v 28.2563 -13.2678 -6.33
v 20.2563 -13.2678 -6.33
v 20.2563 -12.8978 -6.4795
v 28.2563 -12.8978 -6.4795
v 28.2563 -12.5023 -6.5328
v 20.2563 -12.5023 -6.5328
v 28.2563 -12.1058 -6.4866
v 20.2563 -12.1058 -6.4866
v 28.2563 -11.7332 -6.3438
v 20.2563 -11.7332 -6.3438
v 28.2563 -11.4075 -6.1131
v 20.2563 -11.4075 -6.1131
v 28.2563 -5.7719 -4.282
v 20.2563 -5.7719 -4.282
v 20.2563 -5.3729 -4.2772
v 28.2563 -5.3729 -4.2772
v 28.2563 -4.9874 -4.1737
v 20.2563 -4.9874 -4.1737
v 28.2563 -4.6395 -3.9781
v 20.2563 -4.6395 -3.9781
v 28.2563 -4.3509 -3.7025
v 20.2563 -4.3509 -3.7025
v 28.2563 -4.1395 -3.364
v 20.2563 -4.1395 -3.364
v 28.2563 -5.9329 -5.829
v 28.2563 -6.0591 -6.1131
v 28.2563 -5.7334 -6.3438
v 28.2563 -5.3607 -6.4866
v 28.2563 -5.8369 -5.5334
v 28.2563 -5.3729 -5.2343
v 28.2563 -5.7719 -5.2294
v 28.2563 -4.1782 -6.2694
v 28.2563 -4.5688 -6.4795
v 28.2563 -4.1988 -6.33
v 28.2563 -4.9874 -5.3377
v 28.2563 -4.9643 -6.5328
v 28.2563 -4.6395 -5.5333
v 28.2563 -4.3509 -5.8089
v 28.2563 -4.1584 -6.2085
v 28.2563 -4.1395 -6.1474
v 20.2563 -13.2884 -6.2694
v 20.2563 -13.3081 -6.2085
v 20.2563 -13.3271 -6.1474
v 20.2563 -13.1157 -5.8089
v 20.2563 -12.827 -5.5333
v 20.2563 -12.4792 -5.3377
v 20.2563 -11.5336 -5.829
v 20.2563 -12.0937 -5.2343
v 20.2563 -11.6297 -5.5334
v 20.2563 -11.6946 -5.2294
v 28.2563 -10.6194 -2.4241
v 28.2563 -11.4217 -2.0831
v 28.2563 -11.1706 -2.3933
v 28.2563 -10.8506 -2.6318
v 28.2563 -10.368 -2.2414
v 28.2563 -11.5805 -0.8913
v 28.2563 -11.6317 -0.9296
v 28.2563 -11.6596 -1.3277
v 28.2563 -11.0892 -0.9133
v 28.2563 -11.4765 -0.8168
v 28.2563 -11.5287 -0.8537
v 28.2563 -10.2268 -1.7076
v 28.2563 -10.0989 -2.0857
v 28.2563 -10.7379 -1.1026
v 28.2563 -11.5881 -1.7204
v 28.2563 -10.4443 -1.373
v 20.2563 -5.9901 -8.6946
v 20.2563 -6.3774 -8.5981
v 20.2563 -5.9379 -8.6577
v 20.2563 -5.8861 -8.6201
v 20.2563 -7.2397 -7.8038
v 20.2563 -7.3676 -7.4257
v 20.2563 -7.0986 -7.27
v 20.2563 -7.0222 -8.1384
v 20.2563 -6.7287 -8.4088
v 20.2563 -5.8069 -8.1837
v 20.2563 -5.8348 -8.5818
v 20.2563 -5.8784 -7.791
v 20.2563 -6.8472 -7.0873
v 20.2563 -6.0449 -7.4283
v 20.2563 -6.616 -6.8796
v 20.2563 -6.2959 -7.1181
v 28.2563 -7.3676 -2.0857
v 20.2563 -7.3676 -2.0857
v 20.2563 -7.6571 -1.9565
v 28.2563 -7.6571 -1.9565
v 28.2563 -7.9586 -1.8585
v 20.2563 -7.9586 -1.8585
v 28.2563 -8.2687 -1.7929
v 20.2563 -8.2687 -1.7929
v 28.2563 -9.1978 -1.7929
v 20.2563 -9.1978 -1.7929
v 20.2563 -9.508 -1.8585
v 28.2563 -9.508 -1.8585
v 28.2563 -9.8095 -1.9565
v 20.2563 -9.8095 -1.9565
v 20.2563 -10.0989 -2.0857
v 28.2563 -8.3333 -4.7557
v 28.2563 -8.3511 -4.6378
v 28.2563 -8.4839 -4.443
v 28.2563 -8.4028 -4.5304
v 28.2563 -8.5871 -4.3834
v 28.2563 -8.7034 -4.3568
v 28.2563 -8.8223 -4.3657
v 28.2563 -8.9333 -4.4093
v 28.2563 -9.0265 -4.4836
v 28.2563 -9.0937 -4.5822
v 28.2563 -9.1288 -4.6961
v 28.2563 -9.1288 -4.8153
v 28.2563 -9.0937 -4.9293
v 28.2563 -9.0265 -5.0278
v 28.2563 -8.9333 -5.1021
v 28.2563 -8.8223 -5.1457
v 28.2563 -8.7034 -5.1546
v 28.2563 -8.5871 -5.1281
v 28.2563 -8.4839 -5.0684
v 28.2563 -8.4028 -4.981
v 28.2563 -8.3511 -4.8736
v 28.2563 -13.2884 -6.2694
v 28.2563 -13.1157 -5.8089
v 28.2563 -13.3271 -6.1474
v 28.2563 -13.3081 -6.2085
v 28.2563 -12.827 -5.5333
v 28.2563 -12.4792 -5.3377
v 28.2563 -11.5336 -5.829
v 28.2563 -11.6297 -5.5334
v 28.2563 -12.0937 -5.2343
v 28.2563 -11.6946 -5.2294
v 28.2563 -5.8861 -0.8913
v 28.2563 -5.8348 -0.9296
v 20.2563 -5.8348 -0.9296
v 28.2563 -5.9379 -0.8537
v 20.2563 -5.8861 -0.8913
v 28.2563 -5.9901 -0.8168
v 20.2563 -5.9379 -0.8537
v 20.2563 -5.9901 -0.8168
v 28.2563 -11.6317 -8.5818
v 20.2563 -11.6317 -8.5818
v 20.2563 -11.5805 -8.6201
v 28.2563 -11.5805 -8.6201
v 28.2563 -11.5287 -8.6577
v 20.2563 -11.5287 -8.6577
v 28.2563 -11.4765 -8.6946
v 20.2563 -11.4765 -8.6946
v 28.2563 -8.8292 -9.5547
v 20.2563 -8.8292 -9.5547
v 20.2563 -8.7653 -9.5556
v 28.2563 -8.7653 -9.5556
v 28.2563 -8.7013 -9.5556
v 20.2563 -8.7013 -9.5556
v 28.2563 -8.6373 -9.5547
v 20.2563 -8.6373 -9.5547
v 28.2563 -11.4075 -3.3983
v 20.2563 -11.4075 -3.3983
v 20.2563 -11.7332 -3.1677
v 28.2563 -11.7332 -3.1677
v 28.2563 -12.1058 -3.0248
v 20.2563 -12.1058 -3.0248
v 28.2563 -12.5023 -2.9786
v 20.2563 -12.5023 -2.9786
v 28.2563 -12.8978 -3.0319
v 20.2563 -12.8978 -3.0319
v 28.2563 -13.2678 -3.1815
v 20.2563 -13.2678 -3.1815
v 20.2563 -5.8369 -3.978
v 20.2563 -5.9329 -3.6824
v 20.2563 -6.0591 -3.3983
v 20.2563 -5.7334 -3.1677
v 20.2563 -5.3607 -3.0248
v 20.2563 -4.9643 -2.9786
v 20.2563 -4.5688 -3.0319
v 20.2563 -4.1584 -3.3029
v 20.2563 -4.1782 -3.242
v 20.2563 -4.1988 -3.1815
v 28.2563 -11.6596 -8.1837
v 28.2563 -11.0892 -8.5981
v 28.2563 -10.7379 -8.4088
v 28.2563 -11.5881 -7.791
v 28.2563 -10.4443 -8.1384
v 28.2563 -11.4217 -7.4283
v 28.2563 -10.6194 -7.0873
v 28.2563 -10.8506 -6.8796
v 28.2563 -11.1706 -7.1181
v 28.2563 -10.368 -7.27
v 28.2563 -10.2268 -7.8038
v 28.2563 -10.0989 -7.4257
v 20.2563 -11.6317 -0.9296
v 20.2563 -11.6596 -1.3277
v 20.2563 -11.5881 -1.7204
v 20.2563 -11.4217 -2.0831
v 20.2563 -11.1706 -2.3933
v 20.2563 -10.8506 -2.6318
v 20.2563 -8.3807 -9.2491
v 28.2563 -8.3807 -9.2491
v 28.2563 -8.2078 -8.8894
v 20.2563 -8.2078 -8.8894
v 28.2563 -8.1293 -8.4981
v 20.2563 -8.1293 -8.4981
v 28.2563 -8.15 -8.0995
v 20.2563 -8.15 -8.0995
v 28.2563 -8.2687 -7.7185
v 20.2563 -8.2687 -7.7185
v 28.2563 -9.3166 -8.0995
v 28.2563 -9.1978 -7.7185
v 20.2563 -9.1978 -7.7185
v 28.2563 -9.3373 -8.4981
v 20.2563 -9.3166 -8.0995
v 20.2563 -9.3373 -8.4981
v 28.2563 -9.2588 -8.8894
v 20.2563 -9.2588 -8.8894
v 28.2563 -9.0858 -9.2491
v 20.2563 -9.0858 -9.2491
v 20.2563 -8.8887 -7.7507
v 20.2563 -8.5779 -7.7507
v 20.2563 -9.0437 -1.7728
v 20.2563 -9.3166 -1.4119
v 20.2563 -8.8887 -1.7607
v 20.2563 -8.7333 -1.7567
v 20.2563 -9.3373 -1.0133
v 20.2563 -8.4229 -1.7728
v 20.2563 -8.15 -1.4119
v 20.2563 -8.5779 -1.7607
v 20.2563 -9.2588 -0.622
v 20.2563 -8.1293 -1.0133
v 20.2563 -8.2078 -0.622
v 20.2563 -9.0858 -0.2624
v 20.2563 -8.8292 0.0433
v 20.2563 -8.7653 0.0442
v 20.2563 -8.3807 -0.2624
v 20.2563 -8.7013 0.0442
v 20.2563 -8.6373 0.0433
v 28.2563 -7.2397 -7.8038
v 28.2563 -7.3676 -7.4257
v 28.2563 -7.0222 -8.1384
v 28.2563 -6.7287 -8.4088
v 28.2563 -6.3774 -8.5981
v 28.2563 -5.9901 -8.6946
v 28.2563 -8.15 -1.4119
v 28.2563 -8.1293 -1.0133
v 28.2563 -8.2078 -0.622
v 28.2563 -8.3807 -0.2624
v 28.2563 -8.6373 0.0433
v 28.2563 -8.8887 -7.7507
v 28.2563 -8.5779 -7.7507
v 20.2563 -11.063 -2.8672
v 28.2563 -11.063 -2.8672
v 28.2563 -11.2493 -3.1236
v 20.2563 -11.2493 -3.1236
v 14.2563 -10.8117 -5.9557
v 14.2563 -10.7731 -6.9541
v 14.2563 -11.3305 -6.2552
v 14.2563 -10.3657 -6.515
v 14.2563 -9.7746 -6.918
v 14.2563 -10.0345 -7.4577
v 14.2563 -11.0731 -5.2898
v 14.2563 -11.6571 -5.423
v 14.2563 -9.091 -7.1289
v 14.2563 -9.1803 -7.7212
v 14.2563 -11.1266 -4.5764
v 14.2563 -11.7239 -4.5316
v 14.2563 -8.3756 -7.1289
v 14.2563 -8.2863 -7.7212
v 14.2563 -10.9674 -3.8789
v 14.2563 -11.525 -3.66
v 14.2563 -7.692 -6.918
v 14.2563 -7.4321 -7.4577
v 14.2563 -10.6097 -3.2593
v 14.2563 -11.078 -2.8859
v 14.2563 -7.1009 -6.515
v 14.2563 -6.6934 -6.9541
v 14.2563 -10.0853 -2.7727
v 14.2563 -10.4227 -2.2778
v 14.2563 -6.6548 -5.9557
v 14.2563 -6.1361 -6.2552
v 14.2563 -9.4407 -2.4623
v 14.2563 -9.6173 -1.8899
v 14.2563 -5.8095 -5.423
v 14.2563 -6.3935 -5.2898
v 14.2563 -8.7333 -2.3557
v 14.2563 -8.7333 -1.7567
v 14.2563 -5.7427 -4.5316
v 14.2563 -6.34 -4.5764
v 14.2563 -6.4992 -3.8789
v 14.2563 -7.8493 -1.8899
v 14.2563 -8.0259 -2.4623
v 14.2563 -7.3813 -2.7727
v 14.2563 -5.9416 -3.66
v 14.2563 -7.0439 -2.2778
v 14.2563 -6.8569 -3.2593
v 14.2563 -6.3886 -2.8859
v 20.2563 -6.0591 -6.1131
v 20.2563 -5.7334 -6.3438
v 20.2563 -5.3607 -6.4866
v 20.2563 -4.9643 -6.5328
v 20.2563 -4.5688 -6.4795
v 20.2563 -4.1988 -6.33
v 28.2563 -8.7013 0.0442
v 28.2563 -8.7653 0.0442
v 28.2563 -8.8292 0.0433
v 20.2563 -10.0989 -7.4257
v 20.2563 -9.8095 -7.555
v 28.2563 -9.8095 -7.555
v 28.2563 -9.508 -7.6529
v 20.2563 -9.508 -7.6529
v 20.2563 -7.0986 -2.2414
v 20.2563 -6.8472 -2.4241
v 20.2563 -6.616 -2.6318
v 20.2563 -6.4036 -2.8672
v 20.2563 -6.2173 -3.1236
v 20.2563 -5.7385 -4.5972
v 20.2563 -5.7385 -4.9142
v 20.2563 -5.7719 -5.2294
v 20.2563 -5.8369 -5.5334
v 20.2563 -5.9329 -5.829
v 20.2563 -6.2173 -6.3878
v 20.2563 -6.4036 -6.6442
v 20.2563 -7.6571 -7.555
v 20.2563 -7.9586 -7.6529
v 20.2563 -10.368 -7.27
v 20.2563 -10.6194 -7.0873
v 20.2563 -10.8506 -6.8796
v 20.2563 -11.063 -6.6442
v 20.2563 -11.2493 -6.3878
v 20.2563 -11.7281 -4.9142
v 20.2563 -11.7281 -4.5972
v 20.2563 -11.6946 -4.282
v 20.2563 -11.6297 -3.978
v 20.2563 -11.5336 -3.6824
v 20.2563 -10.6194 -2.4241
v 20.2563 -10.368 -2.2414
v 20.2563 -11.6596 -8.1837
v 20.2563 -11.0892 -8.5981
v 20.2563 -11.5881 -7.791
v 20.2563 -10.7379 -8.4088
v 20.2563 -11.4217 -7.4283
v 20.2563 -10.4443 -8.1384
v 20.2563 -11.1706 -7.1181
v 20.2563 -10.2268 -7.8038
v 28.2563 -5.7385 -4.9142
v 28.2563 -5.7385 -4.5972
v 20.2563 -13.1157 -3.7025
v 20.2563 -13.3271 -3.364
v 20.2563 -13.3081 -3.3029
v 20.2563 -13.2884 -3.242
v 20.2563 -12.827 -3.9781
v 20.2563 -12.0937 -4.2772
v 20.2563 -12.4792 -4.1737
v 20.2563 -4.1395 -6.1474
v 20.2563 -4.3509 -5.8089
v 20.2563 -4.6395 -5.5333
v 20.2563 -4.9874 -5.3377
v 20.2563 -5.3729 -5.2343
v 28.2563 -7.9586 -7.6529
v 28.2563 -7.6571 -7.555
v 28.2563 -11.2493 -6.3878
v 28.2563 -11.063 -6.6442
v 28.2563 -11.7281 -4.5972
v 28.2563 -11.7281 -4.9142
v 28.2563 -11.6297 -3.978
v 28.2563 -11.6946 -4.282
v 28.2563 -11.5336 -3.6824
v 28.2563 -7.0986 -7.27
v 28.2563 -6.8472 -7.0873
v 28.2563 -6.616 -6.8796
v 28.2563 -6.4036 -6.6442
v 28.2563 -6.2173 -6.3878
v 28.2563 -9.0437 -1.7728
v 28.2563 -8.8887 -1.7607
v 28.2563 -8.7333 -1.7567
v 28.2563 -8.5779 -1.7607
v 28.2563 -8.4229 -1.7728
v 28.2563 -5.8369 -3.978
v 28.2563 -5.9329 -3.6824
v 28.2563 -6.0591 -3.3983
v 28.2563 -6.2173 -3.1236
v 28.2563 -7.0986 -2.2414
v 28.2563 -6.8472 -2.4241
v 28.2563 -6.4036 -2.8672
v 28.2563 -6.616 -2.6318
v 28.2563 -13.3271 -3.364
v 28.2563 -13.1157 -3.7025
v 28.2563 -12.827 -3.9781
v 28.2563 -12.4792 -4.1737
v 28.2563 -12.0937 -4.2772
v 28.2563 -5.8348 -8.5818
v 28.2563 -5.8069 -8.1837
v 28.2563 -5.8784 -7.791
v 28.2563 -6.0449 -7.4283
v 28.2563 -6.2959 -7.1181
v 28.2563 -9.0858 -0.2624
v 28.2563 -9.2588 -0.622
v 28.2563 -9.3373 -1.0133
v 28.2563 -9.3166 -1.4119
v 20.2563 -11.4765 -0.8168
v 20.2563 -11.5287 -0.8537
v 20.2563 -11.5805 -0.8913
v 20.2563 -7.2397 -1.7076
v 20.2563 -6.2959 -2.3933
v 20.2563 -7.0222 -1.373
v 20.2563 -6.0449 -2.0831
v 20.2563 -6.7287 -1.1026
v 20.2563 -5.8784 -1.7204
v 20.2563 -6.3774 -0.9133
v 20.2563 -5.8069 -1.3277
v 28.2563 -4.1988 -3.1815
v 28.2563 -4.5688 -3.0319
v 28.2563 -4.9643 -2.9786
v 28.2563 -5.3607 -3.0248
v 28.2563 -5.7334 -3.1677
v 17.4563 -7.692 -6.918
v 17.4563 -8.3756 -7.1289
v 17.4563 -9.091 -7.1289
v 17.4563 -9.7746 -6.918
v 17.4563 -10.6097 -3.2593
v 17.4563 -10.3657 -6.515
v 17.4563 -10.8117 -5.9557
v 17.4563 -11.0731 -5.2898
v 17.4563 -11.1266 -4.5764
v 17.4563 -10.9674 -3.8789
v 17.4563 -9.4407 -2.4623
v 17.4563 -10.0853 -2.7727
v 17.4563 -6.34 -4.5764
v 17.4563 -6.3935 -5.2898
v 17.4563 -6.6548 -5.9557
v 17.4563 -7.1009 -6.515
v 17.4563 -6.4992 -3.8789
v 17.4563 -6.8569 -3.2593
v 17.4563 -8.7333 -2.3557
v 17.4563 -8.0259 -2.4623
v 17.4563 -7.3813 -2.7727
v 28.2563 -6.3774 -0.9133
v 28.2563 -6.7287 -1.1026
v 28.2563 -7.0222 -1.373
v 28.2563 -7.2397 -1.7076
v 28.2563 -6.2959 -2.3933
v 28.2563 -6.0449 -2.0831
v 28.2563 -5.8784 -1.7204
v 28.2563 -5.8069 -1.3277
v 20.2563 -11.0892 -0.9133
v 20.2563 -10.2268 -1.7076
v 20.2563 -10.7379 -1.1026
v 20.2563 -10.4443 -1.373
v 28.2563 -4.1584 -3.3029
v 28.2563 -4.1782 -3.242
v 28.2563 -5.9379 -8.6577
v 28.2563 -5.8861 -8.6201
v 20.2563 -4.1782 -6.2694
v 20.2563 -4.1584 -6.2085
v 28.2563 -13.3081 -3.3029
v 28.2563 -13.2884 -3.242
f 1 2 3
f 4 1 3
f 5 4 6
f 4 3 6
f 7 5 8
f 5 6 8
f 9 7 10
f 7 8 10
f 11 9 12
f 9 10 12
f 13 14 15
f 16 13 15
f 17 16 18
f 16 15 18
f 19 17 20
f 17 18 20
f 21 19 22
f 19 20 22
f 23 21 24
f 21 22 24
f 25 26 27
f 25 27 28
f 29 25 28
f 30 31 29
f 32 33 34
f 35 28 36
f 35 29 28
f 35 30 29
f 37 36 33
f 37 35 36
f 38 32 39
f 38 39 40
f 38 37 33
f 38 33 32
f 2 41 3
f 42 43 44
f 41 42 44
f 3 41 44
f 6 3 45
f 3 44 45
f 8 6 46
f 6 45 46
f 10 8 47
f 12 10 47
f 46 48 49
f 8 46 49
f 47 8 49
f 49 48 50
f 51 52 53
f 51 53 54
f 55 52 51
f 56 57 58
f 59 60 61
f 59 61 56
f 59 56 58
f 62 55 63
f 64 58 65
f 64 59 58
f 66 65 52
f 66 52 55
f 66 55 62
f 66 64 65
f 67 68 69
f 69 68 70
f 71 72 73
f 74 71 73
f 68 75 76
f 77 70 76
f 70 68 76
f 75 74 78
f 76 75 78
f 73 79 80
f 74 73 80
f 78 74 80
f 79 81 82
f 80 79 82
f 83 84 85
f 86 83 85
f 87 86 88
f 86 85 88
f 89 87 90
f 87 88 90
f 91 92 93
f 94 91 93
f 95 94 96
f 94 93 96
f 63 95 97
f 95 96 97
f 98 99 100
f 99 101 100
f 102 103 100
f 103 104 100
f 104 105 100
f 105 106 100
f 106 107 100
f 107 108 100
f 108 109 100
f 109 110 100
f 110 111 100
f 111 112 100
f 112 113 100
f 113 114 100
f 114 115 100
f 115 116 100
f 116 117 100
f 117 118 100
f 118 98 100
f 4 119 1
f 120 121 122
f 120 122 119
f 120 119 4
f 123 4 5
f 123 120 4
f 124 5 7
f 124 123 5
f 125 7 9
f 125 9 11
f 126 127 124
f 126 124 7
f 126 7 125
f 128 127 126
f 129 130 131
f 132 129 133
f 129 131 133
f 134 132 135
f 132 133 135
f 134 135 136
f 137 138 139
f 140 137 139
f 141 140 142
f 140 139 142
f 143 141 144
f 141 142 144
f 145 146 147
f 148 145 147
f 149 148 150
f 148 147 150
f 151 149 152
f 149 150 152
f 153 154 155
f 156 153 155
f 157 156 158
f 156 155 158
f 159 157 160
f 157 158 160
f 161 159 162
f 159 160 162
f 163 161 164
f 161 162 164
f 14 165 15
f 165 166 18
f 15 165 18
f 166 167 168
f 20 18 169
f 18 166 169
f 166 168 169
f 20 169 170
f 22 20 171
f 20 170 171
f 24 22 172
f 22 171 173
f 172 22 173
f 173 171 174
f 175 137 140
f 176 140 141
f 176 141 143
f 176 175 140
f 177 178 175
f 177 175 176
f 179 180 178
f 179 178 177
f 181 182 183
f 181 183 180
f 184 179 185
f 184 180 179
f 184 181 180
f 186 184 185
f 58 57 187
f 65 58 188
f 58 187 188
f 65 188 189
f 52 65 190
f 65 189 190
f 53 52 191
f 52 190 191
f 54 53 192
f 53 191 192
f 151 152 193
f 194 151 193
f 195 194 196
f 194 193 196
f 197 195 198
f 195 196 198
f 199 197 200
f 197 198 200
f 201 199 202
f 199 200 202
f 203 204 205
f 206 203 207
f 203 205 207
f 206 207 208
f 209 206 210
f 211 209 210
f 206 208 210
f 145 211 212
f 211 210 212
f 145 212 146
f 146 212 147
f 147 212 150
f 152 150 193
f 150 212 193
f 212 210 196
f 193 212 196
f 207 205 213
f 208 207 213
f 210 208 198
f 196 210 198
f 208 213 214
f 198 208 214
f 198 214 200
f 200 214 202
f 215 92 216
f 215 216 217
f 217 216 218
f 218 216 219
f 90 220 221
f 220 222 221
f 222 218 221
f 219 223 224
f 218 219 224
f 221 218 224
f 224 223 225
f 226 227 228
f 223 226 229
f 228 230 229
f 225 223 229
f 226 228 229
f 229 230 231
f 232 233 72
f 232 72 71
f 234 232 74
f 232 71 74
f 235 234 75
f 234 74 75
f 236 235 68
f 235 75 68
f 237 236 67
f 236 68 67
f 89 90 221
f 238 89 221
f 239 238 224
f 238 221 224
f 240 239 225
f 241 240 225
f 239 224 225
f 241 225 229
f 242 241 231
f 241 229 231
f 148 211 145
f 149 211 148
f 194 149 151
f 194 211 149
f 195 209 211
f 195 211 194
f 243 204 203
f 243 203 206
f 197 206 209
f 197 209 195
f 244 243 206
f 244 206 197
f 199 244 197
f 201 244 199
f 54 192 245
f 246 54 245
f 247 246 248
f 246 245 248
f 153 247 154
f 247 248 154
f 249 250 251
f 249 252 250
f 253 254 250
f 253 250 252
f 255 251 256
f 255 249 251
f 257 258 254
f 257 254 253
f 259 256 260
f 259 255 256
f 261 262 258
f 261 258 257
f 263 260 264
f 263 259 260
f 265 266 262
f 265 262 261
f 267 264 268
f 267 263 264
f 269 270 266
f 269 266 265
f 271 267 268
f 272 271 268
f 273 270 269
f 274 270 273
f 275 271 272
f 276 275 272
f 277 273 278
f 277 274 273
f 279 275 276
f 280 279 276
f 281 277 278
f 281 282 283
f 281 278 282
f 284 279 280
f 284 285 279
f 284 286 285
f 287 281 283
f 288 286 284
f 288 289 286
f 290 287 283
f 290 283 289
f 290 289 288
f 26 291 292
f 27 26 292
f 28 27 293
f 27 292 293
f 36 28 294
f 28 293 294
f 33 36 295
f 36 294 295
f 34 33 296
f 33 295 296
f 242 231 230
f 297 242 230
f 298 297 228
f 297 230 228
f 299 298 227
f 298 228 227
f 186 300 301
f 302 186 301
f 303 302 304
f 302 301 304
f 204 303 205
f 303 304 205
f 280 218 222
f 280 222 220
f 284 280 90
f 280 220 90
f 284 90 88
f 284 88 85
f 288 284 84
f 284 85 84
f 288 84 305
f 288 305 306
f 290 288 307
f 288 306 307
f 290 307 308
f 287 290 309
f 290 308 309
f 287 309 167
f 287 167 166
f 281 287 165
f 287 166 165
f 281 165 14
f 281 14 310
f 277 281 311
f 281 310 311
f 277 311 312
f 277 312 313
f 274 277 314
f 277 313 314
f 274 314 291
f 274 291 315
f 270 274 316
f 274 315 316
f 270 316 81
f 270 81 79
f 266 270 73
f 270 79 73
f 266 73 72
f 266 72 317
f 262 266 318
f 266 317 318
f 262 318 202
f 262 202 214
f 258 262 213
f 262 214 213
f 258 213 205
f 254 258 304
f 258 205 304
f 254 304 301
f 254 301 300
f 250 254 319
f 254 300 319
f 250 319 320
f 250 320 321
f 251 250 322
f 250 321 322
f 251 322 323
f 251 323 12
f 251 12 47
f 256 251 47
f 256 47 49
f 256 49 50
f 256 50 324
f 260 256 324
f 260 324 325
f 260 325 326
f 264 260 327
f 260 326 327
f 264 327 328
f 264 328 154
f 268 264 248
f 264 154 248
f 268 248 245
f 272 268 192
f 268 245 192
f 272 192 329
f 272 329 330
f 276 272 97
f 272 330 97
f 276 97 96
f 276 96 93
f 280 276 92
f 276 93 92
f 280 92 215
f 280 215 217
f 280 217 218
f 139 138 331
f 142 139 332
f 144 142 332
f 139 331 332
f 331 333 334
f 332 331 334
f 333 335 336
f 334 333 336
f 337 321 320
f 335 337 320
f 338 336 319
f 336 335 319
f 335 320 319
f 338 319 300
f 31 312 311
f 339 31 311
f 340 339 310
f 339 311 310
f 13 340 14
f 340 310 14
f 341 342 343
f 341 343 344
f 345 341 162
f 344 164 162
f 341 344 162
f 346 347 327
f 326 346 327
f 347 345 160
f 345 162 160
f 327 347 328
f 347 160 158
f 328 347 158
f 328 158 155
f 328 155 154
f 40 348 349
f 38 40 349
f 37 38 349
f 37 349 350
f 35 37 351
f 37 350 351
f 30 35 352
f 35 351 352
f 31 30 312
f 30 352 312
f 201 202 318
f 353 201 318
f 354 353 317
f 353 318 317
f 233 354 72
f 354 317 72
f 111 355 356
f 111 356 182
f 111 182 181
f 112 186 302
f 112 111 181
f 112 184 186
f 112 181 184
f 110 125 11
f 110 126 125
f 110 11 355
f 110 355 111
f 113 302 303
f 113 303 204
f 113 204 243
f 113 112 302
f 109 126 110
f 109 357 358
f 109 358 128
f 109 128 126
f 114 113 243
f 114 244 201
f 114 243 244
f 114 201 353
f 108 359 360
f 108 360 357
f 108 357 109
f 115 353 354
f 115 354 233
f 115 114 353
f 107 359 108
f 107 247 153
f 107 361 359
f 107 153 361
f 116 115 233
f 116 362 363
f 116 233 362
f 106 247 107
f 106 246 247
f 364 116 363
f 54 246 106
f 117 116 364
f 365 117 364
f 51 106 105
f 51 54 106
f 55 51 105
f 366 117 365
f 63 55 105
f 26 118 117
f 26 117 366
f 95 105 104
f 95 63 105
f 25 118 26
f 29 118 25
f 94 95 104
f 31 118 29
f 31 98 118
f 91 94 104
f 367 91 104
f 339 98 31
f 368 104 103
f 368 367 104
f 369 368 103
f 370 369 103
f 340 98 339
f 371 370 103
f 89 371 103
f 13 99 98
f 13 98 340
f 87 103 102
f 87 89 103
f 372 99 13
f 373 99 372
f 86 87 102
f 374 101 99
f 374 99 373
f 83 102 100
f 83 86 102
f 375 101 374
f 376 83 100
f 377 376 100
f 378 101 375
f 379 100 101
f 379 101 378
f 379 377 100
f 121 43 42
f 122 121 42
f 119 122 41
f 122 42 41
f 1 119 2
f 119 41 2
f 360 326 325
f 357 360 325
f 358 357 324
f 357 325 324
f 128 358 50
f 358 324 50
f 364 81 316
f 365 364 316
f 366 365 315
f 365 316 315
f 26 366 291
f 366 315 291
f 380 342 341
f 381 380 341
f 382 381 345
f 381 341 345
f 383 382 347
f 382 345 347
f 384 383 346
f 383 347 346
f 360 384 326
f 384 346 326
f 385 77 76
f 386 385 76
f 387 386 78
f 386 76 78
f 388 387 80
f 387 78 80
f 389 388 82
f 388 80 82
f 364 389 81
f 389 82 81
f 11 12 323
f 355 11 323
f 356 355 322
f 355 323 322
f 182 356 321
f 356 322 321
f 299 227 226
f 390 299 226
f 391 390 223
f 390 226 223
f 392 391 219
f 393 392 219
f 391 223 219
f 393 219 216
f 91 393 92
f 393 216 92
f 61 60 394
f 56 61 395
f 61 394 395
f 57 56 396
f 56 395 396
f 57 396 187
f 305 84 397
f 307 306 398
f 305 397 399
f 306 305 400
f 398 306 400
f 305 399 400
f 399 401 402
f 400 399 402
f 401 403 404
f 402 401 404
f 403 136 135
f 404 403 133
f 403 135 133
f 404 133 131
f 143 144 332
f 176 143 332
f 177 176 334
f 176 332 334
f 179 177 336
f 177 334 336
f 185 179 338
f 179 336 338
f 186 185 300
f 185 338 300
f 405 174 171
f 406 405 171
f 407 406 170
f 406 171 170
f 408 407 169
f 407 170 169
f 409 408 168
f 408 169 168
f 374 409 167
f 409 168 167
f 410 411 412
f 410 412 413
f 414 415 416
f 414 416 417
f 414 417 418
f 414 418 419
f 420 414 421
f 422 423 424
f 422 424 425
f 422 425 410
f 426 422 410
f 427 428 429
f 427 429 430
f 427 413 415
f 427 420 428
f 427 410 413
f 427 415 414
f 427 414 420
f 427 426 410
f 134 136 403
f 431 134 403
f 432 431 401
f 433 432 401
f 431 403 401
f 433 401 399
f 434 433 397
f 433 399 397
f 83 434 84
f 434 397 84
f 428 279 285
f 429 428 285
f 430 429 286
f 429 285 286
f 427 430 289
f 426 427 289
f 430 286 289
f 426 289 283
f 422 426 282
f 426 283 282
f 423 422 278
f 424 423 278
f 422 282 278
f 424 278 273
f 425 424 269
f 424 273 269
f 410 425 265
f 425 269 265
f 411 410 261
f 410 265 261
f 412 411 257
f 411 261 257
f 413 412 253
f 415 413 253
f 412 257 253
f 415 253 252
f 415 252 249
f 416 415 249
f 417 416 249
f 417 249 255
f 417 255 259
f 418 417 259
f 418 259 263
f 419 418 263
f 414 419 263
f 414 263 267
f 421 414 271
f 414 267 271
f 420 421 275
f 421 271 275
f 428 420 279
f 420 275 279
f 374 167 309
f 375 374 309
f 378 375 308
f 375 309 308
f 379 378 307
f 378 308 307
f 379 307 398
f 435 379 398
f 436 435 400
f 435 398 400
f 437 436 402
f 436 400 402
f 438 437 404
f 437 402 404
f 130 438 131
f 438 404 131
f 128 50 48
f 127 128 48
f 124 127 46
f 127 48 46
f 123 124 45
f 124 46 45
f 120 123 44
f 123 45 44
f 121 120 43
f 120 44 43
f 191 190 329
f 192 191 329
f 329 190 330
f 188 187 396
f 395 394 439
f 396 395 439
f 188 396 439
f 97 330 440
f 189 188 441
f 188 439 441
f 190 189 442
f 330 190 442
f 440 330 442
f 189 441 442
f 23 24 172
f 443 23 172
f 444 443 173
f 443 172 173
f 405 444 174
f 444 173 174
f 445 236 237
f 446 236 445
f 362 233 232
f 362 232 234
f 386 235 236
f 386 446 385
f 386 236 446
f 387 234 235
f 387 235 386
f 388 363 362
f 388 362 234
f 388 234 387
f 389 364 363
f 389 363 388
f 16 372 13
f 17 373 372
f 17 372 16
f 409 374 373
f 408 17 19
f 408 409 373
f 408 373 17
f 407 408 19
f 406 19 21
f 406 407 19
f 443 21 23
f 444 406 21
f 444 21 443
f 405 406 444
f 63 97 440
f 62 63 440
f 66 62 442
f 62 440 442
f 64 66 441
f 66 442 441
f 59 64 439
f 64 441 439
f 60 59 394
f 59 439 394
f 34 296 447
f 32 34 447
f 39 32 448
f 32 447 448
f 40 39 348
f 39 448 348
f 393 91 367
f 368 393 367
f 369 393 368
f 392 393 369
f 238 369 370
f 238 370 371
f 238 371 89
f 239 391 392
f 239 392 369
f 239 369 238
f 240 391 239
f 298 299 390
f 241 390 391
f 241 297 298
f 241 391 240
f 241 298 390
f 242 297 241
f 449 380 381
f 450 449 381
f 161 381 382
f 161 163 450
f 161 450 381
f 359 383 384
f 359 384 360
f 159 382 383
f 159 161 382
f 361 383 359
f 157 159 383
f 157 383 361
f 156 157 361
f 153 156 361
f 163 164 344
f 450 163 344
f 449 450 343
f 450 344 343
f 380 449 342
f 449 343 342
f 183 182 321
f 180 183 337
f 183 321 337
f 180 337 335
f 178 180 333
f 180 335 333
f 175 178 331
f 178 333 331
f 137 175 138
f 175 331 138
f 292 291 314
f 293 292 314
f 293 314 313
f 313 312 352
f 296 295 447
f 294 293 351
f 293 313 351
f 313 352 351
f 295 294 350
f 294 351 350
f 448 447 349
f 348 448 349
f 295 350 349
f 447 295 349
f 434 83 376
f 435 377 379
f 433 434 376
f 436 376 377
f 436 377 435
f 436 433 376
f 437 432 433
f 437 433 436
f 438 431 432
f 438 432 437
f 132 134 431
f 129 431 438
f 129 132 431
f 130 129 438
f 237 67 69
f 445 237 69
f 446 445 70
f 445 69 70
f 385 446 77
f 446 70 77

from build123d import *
from build123d.topology import SkipClean

# Parameters (mm, degrees)
ISO_START                                 = 20.256289073
ISO_SPUR_GEAR_0_8M_10T_20PA_8FW_2_R       = 0.4
ISO_SPUR_GEAR_0_8M_10T_20PA_8FW_S10_DEPTH = 8
BOSS_EXTRUDE1_DEPTH                       = 6
BOSS_EXTRUDE1_DEPTH_BACK                  = 8
SKETCH1_R                                 = 2.999
SKETCH2_R                                 = 2.4
CUT_EXTRUDE1_DEPTH                        = 3.2


# Read off the part's stored shape, not the designer's step: ISO - Spur gear 0.8M 10T 20PA 8FW ---S10A75H50L0.8N
with BuildPart() as part:
    # ISO - Spur gear 0.8M 10T 20PA 8FW -- 2 → ISO - Spur gear 0.8M 10T 20PA 8FW ---S10 (new body)
    with BuildSketch(Plane.YZ.offset(ISO_START)):
        with BuildLine():
            ThreePointArc((-8.829245422, -9.554744908), (-8.733282752, -9.555704257), (-8.637320082, -9.554744908))
            ThreePointArc((-8.637320082, -9.554744908), (-8.156276182, -8.696191622), (-8.268716011, -7.718503397))
            ThreePointArc((-8.268716011, -7.718503397), (-7.806540786, -7.60792275), (-7.367635501, -7.425724592))
            ThreePointArc((-7.367635501, -7.425724592), (-6.883930514, -8.282781454), (-5.990112863, -8.694615143))
            ThreePointArc((-5.990112863, -8.694615143), (-5.911913541, -8.63898583), (-5.834842001, -8.581804258))
            ThreePointArc((-5.834842001, -8.581804258), (-5.950314271, -7.604469549), (-6.615950723, -6.879593633))
            ThreePointArc((-6.615950723, -6.879593633), (-6.307040786, -6.518472229), (-6.059052342, -6.113088769))
            ThreePointArc((-6.059052342, -6.113088769), (-5.163961403, -6.522147678), (-4.198777965, -6.329955298))
            ThreePointArc((-4.198777965, -6.329955298), (-4.168211474, -6.23898583), (-4.139469773, -6.147423452))
            ThreePointArc((-4.139469773, -6.147423452), (-4.807351731, -5.42461596), (-5.771934306, -5.229430316))
            ThreePointArc((-5.771934306, -5.229430316), (-5.734282752, -4.755704258), (-5.771934306, -4.281978199))
            ThreePointArc((-5.771934306, -4.281978199), (-4.807351731, -4.086792554), (-4.139469773, -3.363985063))
            ThreePointArc((-4.139469773, -3.363985063), (-4.168211474, -3.272422685), (-4.198777965, -3.181453217))
            ThreePointArc((-4.198777965, -3.181453217), (-5.163961403, -2.989260837), (-6.059052342, -3.398319746))
            ThreePointArc((-6.059052342, -3.398319746), (-6.307040786, -2.992936286), (-6.615950723, -2.631814882))
            ThreePointArc((-6.615950723, -2.631814882), (-5.950314271, -1.906938966), (-5.834842001, -0.929604257))
            ThreePointArc((-5.834842001, -0.929604257), (-5.91191354, -0.872422684), (-5.990112863, -0.816793372))
            ThreePointArc((-5.990112863, -0.816793372), (-6.883930514, -1.228627061), (-7.367635501, -2.085683923))
            ThreePointArc((-7.367635501, -2.085683923), (-7.806540786, -1.903485765), (-8.268716011, -1.792905118))
            ThreePointArc((-8.268716011, -1.792905118), (-8.156276182, -0.815216893), (-8.637320082, 0.043336393))
            ThreePointArc((-8.637320082, 0.043336393), (-8.733282752, 0.044295743), (-8.829245422, 0.043336393))
            ThreePointArc((-8.829245422, 0.043336393), (-9.310289322, -0.815216893), (-9.197849493, -1.792905118))
            ThreePointArc((-9.197849493, -1.792905118), (-9.660024718, -1.903485765), (-10.098930003, -2.085683923))
            ThreePointArc((-10.098930003, -2.085683923), (-10.58263499, -1.228627061), (-11.476452641, -0.816793372))
            ThreePointArc((-11.476452641, -0.816793372), (-11.554651964, -0.872422684), (-11.631723503, -0.929604257))
            ThreePointArc((-11.631723503, -0.929604257), (-11.516251233, -1.906938966), (-10.850614781, -2.631814882))
            ThreePointArc((-10.850614781, -2.631814882), (-11.159524718, -2.992936286), (-11.407513162, -3.398319746))
            ThreePointArc((-11.407513162, -3.398319746), (-12.302604101, -2.989260837), (-13.267787539, -3.181453217))
            ThreePointArc((-13.267787539, -3.181453217), (-13.29835403, -3.272422685), (-13.327095731, -3.363985063))
            ThreePointArc((-13.327095731, -3.363985063), (-12.659213773, -4.086792554), (-11.694631199, -4.281978199))
            ThreePointArc((-11.694631199, -4.281978199), (-11.732282752, -4.755704258), (-11.694631199, -5.229430316))
            ThreePointArc((-11.694631199, -5.229430316), (-12.659213774, -5.42461596), (-13.327095731, -6.147423452))
            ThreePointArc((-13.327095731, -6.147423452), (-13.29835403, -6.23898583), (-13.267787539, -6.329955298))
            ThreePointArc((-13.267787539, -6.329955298), (-12.302604101, -6.522147678), (-11.407513162, -6.113088769))
            ThreePointArc((-11.407513162, -6.113088769), (-11.159524718, -6.518472229), (-10.850614781, -6.879593633))
            ThreePointArc((-10.850614781, -6.879593633), (-11.516251233, -7.604469549), (-11.631723503, -8.581804258))
            ThreePointArc((-11.631723503, -8.581804258), (-11.554651963, -8.63898583), (-11.476452641, -8.694615143))
            ThreePointArc((-11.476452641, -8.694615143), (-10.58263499, -8.282781454), (-10.098930003, -7.425724592))
            ThreePointArc((-10.098930003, -7.425724592), (-9.660024718, -7.60792275), (-9.197849493, -7.718503397))
            ThreePointArc((-9.197849493, -7.718503397), (-9.310289322, -8.696191622), (-8.829245422, -9.554744908))
        make_face()
        with Locations((-8.733282752, -4.755704257)):
            Circle(ISO_SPUR_GEAR_0_8M_10T_20PA_8FW_2_R, mode=Mode.SUBTRACT)
    extrude(amount=ISO_SPUR_GEAR_0_8M_10T_20PA_8FW_S10_DEPTH)

    # Sketch1 → Boss-Extrude1 (add, two sides: drawn at the far end of the back side and taken through both)
    with SkipClean():  # the faces are left unmerged after this step: merging them gives an invalid solid
        with BuildSketch(Plane.ZY.offset(-20.256289073).offset(-BOSS_EXTRUDE1_DEPTH_BACK)):
            with Locations((-4.755704257, -8.733282752)):
                Circle(SKETCH1_R)
        extrude(amount=BOSS_EXTRUDE1_DEPTH + BOSS_EXTRUDE1_DEPTH_BACK)

    # Sketch2 → Cut-Extrude1 (cut)
    with SkipClean():  # the faces are left unmerged after this step: merging them gives an invalid solid
        with BuildSketch(Plane.ZY.offset(-14.256289073)):
            with Locations((-4.755704257, -8.733282752)):
                Circle(SKETCH2_R)
        extrude(amount=-CUT_EXTRUDE1_DEPTH, mode=Mode.SUBTRACT)


solid = part.part
